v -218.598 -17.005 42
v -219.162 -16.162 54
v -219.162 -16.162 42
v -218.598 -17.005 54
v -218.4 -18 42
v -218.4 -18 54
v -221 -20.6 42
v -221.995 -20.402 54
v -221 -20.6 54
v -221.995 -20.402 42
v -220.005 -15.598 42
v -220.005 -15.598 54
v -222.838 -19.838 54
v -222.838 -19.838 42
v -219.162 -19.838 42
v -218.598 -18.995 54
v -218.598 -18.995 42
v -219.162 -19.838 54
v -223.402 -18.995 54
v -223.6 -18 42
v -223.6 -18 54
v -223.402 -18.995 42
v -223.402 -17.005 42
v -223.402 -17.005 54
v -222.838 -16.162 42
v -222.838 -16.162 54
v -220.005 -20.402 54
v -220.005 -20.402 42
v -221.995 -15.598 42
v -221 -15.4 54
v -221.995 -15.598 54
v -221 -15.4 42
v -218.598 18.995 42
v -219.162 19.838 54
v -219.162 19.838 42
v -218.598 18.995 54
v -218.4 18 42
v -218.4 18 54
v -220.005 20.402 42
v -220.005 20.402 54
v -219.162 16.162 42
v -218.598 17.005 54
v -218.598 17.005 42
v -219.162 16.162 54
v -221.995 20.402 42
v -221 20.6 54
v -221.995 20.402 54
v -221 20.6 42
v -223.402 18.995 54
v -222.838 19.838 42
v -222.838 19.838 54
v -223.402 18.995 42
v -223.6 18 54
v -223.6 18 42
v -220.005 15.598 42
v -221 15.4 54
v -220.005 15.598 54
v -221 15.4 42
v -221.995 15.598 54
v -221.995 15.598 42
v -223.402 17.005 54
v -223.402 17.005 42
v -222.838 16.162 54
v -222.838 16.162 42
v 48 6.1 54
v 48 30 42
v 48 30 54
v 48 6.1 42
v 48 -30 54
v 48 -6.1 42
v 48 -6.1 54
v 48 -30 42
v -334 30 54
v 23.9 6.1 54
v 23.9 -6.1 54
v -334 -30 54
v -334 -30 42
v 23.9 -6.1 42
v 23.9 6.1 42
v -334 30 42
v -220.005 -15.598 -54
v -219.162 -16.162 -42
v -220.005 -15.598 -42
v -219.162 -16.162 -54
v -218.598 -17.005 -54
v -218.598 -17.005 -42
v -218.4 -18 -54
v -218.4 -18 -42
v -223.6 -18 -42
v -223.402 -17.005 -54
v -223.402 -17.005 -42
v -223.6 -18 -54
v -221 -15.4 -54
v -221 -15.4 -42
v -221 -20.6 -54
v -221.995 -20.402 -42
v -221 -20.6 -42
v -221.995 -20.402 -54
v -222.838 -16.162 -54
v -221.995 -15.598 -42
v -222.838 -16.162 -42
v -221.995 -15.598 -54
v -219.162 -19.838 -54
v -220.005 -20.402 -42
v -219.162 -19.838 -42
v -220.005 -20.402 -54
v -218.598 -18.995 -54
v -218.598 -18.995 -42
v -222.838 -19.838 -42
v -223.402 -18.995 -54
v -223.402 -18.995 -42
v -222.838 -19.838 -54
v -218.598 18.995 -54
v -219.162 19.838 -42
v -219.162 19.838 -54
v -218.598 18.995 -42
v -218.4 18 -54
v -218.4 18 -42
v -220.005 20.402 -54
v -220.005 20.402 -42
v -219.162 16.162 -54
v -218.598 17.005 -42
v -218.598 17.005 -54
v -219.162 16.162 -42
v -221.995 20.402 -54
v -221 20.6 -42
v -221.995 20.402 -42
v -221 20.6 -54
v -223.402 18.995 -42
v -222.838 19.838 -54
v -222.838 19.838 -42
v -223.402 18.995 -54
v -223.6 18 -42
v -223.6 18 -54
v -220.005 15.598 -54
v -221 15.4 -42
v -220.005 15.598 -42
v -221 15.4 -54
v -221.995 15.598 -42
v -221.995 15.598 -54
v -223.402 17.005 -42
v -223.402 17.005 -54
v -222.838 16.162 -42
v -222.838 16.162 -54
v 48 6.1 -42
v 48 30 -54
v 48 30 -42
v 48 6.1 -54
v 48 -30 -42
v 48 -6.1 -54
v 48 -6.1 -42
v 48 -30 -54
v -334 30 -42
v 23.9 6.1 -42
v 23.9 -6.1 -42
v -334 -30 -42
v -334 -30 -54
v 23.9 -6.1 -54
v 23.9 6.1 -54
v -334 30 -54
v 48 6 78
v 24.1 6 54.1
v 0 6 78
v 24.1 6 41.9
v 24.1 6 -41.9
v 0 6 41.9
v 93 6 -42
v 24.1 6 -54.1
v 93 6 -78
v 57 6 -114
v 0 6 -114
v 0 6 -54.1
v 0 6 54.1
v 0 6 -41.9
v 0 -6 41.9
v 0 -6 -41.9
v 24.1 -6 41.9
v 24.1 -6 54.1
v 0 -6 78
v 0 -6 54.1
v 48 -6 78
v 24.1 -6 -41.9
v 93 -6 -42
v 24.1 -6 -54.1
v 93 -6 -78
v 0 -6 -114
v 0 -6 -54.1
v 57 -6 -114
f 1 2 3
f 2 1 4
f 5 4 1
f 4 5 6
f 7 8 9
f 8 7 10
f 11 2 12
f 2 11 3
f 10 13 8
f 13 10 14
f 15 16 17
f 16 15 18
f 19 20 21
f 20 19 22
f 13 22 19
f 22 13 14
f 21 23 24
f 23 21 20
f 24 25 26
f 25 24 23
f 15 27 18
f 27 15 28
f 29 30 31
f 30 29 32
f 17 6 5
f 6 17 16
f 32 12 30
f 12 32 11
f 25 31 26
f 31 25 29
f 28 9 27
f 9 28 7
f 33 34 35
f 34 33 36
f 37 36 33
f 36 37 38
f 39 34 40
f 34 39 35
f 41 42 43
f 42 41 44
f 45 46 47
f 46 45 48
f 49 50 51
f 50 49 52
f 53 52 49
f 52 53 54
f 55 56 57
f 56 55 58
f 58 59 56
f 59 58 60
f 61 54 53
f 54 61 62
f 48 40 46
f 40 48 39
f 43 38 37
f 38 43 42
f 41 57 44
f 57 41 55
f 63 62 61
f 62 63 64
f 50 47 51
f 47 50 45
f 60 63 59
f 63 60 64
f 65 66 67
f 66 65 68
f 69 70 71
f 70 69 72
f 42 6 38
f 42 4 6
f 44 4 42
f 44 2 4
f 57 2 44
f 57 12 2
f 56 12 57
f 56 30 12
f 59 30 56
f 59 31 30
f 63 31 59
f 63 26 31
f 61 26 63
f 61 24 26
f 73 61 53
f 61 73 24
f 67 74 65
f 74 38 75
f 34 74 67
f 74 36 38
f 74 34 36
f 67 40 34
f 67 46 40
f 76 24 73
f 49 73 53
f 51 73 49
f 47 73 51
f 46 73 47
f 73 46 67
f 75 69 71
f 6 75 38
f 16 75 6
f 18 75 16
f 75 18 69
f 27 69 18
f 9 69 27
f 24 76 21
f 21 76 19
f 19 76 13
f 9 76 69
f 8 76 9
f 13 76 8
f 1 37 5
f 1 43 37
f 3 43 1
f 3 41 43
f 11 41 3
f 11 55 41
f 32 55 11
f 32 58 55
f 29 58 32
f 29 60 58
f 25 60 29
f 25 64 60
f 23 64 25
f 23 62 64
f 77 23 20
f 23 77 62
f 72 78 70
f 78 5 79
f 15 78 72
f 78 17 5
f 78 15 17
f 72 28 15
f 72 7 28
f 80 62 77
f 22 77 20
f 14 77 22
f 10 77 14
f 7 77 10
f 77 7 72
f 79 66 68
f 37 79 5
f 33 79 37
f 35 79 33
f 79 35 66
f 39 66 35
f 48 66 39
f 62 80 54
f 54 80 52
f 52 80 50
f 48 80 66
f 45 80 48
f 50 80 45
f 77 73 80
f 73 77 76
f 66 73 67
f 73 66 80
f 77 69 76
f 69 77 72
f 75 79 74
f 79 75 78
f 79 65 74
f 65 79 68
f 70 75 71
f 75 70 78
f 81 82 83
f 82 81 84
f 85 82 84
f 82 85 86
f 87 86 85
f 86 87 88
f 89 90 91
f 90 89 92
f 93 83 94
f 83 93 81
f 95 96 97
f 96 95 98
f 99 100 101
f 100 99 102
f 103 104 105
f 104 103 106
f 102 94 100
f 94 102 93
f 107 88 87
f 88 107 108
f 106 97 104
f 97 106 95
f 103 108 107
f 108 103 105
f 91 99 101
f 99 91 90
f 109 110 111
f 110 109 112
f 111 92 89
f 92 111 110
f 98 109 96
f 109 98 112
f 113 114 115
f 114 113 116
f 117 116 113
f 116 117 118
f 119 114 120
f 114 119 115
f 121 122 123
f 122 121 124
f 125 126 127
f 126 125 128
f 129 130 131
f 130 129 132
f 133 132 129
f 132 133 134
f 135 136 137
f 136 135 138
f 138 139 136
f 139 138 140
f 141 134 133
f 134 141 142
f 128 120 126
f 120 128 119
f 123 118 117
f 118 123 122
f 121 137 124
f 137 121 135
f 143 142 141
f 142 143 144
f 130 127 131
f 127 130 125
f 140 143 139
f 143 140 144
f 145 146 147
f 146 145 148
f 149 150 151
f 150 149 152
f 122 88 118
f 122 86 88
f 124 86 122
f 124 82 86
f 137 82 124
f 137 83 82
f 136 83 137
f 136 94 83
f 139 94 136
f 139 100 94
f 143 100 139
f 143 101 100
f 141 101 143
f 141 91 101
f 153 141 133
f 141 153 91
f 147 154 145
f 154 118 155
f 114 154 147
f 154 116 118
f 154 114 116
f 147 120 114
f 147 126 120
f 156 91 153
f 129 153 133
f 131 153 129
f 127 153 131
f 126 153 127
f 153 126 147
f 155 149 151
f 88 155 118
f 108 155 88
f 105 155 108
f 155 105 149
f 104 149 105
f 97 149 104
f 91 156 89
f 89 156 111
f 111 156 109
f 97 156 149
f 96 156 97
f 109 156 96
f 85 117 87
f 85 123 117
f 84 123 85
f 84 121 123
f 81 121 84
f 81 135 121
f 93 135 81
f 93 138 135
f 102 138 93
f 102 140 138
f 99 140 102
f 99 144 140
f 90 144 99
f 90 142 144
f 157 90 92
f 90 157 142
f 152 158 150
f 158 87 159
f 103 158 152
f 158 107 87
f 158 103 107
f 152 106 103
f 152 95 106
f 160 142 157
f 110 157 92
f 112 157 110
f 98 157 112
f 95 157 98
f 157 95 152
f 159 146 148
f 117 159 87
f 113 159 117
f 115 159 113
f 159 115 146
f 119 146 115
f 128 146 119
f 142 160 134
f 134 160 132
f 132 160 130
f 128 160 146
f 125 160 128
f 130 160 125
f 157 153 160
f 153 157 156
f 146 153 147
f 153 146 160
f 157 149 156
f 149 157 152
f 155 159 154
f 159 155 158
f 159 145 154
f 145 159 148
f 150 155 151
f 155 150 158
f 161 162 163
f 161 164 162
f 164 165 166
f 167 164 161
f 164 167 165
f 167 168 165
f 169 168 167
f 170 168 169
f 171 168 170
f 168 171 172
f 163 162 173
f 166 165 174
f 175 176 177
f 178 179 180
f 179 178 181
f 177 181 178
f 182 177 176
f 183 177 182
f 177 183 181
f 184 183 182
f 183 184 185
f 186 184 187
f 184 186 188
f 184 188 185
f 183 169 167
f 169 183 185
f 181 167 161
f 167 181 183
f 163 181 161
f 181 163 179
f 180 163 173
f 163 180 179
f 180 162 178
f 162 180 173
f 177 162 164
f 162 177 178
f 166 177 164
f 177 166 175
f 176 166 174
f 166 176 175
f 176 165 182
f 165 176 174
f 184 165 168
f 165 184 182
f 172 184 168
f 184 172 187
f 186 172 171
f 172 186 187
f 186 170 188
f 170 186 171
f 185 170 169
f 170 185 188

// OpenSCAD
// file: ../../lib/util.scad
// ==========================================================================
//  Turtle Body -- shared helper modules and functions
// --------------------------------------------------------------------------
//  Small pieces that were copy-pasted across the standalone files. Geometry
//  lives in the per-subsystem lib/ modules; this file is only glue.
//
//  Definitions only -- no top-level geometry, no top-level assignments.
// ==========================================================================

use <params.scad>

// Colour wrapper for wooden parts. When colour coding is off, every wooden
// component renders in one neutral wood tone; bottles, hardware, sails and
// printed parts keep their own colours and never call this.
module wood_color(coded_color, enabled = true, neutral = [0.94, 0.83, 0.62]) {
    color(enabled ? coded_color : neutral) children();
}

// scalar clamp
function clamp(v, lo, hi) = v < lo ? lo : (v > hi ? hi : v);

// Visual-only M6 bolt: plain shaft + hex-less cylindrical head. No thread,
// no torque rating -- a placeholder for fit inspection.
//  Local Z=0 is the underside of the head; the shaft runs toward +Z from Z=0
//  (plus an optional tip_extension), the head sits at Z=-head_t..0. Matches
//  the standalone files.
module m6_bolt_placeholder(grip_length, tip_extension = 1,
                           shaft_d = undef, head_d = undef, head_t = undef,
                           color_rgb = [0.15, 0.15, 0.15], fn = 48) {
    sd = shaft_d == undef ? p_m6_bolt_shaft_d() : shaft_d;
    hd = head_d  == undef ? p_m6_bolt_head_d()  : head_d;
    ht = head_t  == undef ? p_m6_bolt_head_t()  : head_t;
    assert(grip_length > 0, "m6_bolt_placeholder: grip_length must be positive.");
    color(color_rgb)
        union() {
            cylinder(d = sd, h = grip_length + tip_extension, $fn = fn);
            translate([0, 0, -ht])
                cylinder(d = hd, h = ht, $fn = fn);
        }
}

// Regular hexagonal prism specified by across-flats width (OpenSCAD's
// cylinder($fn=6) is specified across corners, which is the usual trap).
module hex_prism_af(across_flats, h, center = false) {
    cylinder(d = across_flats / cos(30), h = h, $fn = 6, center = center);
}
// file: ../../lib/head_fin.scad
// ==========================================================================
//  Turtle Body -- head fin: front fin  (lib module, EXPERIMENTAL)
// --------------------------------------------------------------------------
//  The rear fin's counterpart on the front (-X) port. Three wooden pieces:
//  one vertical triangular fin and two flat bottle-holder slats, one above
//  and one below the front bottle. The slats bolt to the front port's Little
//  John M5 pairs exactly like the rear-fin shafts, run the length of the
//  bottle, and half-lap into the fin, whose rear edge abuts the bottle base.
//
//  Local frame (installed by the full turtle):
//    X = along the bottle axis, outward. X = 0 is the fin's rear edge = the
//        bottle base. Slats run X = -reach .. overlap; fin X = 0 .. width.
//    Y = across (slat width, fin thickness), centred on the bottle axis.
//    Z = vertical, centred on the bottle axis, +Z = physically UP (v6.3.0).
//        Slats at Z = +-(d/2 .. d/2+t).
//
//  Fin width (X) = the widest board, p_fin_board_w(): the fin is cut across
//  one board. v6.3.1 profile: the top edge runs out to p_head_fin_heel_x()
//  (where the slats end); the leading edge slopes down and FORWARD to a
//  vertical flat toe, p_head_fin_toe_h() tall, at the full width; the bottom
//  edge is full width. v6.3.2: the fin also drops p_head_fin_drop() below
//  that, with a raked forefoot (bottom-front corner set back by
//  p_head_fin_forefoot_setback()); the rear edge runs straight down. Earlier: v5.8.0 symmetric spear head (both corners cut
//  to a flat nose); v6.3.0 the mirror slope (full width along the top).
//
//  Half-laps split the X = 0..overlap common zone at overlap/2: fin slots
//  open from its rear edge, slat slots open from their outer ends. Clearance
//  is 0.2 mm TOTAL, centred on the 12 mm board (opening 12.2), as the rear
//  fin. Not built, fitted or tested.
//
//  Definitions only. Geometry is emitted by head_fin_assembly() or the
//  individual part modules.
// ==========================================================================

use <params.scad>
use <util.scad>

function hf_t()            = p_wood_t();
function hf_fin_width()    = p_head_fin_w();          // 93
function hf_fin_height()   = p_head_fin_h();          // 156
function hf_heel_x()       = p_head_fin_heel_x();     // 48: top-edge length
function hf_toe_h()        = p_head_fin_toe_h();      // 24: bottom-front flat
function hf_drop()         = p_head_fin_drop();       // 36: extension below the toe
function hf_setback()      = p_head_fin_forefoot_setback();   // 18
function hf_bottom_z()     = -hf_fin_height() / 2 - hf_drop();  // -114
// leading-edge X at height z (top heel -> top of the toe flat)
function hf_leading_x(z)   = hf_heel_x()
    + (hf_fin_width() - hf_heel_x())
      * (hf_fin_height() / 2 - z) / (hf_fin_height() - hf_toe_h());
function hf_overlap()      = p_head_slat_overlap();   // 48
function hf_joint_meet_x() = hf_overlap() / 2;        // 24
function hf_slat_length()  = p_head_slat_len();       // 382
function hf_slat_width()   = p_head_slat_width();     // 60
function hf_slat_rear_x()  = hf_overlap();
function hf_slat_front_x() = hf_slat_rear_x() - hf_slat_length();   // -334
function hf_upper_slat_z0() = p_bottle_d() / 2;                     // 42
function hf_lower_slat_z0() = -p_bottle_d() / 2 - hf_t();           // -54

module hf_assert_valid(half_lap, hole_from_front, hole_d) {
    t = hf_t();
    assert(t > 0 && p_bottle_d() > 0 && p_fin_board_w() > 2 * t);
    assert(half_lap >= 0 && half_lap < t);
    assert(hf_overlap() > half_lap && hf_overlap() < hf_fin_width(),
           "head_fin: slat overlap must sit inside the fin width.");
    assert(hf_heel_x() >= hf_overlap() && hf_heel_x() < hf_fin_width(),
           "head_fin: the top edge must reach at or beyond the slat ends.");
    assert(hf_toe_h() >= 0 && hf_toe_h() < hf_fin_height(),
           "head_fin: the bottom-front flat must be shorter than the fin.");
    assert(hf_drop() >= 0 && hf_setback() >= 0
           && hf_setback() < hf_fin_width() - hf_heel_x(),
           "head_fin: forefoot setback leaves no bottom edge.");
    // every slat end (both faces) must stay behind the sloping leading edge
    for (z = [hf_lower_slat_z0(), hf_lower_slat_z0() + t,
              hf_upper_slat_z0(), hf_upper_slat_z0() + t])
        assert(hf_leading_x(z) > hf_overlap(),
               "head_fin: a slat end pokes through the fin's leading edge.");
    assert(hf_upper_slat_z0() + t + half_lap / 2 < hf_fin_height() / 2,
           "head_fin: upper slat slot breaks out of the fin's top edge.");
    assert(hf_slat_width() > t + half_lap);
    assert(hole_d > 0 && 2 * p_eco_screw_pair_offset() + hole_d < hf_slat_width(),
           "head_fin: M5 hole pair runs off the slat edges.");
    assert(hole_from_front > hole_d / 2
           && hf_slat_front_x() + hole_from_front + hole_d / 2 < 0,
           "head_fin: slat hole must stay in the unjointed portion, behind the bottle base.");
}

module head_fin(half_lap = p_fit_clearance(), fn = undef, colored = true) {
    t = hf_t(); eps = p_eps();
    nn = fn == undef ? p_fn_wood() : fn;
    W = hf_fin_width(); H2 = hf_fin_height() / 2;
    // colour code: blue fin. Neutral: p_wood_shade_fin(), shared with the
    // rear and ballast fins.
    wood_color([0.15, 0.45, 0.85], colored, p_wood_shade_fin()) rotate([90, 0, 0])
        linear_extrude(height = t, center = true, $fn = nn) difference() {
            polygon([[0, hf_bottom_z()], [W - hf_setback(), hf_bottom_z()],
                     [W, -H2], [W, -H2 + hf_toe_h()],
                     [hf_heel_x(), H2], [0, H2]]);
            for (z = [hf_upper_slat_z0(), hf_lower_slat_z0()])
                translate([-eps, z - half_lap / 2])
                    square([hf_joint_meet_x() + half_lap / 2 + eps, t + half_lap]);
        }
}

module head_slat(z0 = 0, half_lap = p_fit_clearance(),
                 hole_from_front = undef, hole_d = undef, colored = true) {
    t = hf_t(); eps = p_eps();
    hff = hole_from_front == undef ? p_head_slat_hole_from_front() : hole_from_front;
    hd  = hole_d == undef ? p_m5_hole_d() : hole_d;
    wood_color([0.55, 0.2, 0.7], colored, p_wood_shade_rear_fin()) difference() {
        translate([hf_slat_front_x(), -hf_slat_width() / 2, z0])
            cube([hf_slat_length(), hf_slat_width(), t]);
        // M5 pair across the slat width, matching the John clamp pair
        for (dy = [-p_eco_screw_pair_offset(), p_eco_screw_pair_offset()])
            translate([hf_slat_front_x() + hff, dy, z0 - eps])
                cylinder(d = hd, h = t + 2 * eps, $fn = 16);
        translate([hf_joint_meet_x() - half_lap / 2, -(t + half_lap) / 2, z0 - eps])
            cube([hf_slat_rear_x() - hf_joint_meet_x() + half_lap / 2 + eps,
                  t + half_lap, t + 2 * eps]);
    }
}

module head_fin_assembly(half_lap = p_fit_clearance(), exploded = 0,
                         fn = undef, colored = true) {
    hf_assert_valid(half_lap, p_head_slat_hole_from_front(), p_m5_hole_d());
    translate([exploded, 0, 0]) head_fin(half_lap, fn, colored);
    translate([0, 0,  exploded]) head_slat(hf_upper_slat_z0(), half_lap, colored = colored);
    translate([0, 0, -exploded]) head_slat(hf_lower_slat_z0(), half_lap, colored = colored);

    echo("HEAD FIN: fin = ", hf_fin_width(), " x ", hf_fin_height() + hf_drop(),
         " | slat length = ", hf_slat_length(),
         " | hole from front = ", p_head_slat_hole_from_front(),
         " | half-lap engagement = ", p_head_half_lap_engagement(),
         " | slot opening = ", hf_t() + half_lap);
}
// main file
/*
 Hope Turtle head fin (front fin, v6.3.1 profile). Units: mm. License: CERN-OHL-S-2.0.
 EXPERIMENTAL -- not built, fitted or tested.
 Three wooden pieces: one blue raked fin and two purple bottle-holder
 slats (above and below the front bottle). The slats bolt to the front-port
 Little John M5 pairs like the rear-fin shafts; the fin half-laps into their
 outer ends and abuts the bottle base. Slot openings 12.2 mm (0.2 mm TOTAL,
 centred). Bottle is F5 reference only, excluded from F6/STL.

 SOURCE FILE — geometry lives in lib/head_fin.scad + lib/params.scad.
 The committed self-contained file is generated by build/build.py.
*/

/* [Fit and tuning] */
half_lap_clearance = 0.2; // TOTAL extra slot width, centred on the board
exploded = 0;

/* [Display] */
part = "assembly"; // [assembly,fin,slat]
show_bottle_mockup = true;  // F5 reference only, excluded from F6/STL
enable_color_coding = true; // wooden parts; false = neutral shades of brown

/* [Render] */
fn = 96;

use <../../lib/head_fin.scad>
use <../../lib/params.scad>

module _bottle_reference() {
    // the front bottle, base at the fin's rear edge (X = 0), axis on X
    color([0.3, 0.85, 0.95, 0.35])
        rotate([0, -90, 0]) cylinder(d = p_bottle_d(), h = p_bottle_h(), $fn = 64);
}

if (part == "assembly") {
    head_fin_assembly(half_lap = half_lap_clearance, exploded = exploded,
                      fn = fn, colored = enable_color_coding);
    if (show_bottle_mockup && exploded == 0) %_bottle_reference();
} else if (part == "fin") {
    head_fin(half_lap = half_lap_clearance, fn = fn, colored = enable_color_coding);
} else if (part == "slat") {
    head_slat(half_lap = half_lap_clearance, colored = enable_color_coding);
} else {
    assert(false, str("Unknown part: ", part));
}
